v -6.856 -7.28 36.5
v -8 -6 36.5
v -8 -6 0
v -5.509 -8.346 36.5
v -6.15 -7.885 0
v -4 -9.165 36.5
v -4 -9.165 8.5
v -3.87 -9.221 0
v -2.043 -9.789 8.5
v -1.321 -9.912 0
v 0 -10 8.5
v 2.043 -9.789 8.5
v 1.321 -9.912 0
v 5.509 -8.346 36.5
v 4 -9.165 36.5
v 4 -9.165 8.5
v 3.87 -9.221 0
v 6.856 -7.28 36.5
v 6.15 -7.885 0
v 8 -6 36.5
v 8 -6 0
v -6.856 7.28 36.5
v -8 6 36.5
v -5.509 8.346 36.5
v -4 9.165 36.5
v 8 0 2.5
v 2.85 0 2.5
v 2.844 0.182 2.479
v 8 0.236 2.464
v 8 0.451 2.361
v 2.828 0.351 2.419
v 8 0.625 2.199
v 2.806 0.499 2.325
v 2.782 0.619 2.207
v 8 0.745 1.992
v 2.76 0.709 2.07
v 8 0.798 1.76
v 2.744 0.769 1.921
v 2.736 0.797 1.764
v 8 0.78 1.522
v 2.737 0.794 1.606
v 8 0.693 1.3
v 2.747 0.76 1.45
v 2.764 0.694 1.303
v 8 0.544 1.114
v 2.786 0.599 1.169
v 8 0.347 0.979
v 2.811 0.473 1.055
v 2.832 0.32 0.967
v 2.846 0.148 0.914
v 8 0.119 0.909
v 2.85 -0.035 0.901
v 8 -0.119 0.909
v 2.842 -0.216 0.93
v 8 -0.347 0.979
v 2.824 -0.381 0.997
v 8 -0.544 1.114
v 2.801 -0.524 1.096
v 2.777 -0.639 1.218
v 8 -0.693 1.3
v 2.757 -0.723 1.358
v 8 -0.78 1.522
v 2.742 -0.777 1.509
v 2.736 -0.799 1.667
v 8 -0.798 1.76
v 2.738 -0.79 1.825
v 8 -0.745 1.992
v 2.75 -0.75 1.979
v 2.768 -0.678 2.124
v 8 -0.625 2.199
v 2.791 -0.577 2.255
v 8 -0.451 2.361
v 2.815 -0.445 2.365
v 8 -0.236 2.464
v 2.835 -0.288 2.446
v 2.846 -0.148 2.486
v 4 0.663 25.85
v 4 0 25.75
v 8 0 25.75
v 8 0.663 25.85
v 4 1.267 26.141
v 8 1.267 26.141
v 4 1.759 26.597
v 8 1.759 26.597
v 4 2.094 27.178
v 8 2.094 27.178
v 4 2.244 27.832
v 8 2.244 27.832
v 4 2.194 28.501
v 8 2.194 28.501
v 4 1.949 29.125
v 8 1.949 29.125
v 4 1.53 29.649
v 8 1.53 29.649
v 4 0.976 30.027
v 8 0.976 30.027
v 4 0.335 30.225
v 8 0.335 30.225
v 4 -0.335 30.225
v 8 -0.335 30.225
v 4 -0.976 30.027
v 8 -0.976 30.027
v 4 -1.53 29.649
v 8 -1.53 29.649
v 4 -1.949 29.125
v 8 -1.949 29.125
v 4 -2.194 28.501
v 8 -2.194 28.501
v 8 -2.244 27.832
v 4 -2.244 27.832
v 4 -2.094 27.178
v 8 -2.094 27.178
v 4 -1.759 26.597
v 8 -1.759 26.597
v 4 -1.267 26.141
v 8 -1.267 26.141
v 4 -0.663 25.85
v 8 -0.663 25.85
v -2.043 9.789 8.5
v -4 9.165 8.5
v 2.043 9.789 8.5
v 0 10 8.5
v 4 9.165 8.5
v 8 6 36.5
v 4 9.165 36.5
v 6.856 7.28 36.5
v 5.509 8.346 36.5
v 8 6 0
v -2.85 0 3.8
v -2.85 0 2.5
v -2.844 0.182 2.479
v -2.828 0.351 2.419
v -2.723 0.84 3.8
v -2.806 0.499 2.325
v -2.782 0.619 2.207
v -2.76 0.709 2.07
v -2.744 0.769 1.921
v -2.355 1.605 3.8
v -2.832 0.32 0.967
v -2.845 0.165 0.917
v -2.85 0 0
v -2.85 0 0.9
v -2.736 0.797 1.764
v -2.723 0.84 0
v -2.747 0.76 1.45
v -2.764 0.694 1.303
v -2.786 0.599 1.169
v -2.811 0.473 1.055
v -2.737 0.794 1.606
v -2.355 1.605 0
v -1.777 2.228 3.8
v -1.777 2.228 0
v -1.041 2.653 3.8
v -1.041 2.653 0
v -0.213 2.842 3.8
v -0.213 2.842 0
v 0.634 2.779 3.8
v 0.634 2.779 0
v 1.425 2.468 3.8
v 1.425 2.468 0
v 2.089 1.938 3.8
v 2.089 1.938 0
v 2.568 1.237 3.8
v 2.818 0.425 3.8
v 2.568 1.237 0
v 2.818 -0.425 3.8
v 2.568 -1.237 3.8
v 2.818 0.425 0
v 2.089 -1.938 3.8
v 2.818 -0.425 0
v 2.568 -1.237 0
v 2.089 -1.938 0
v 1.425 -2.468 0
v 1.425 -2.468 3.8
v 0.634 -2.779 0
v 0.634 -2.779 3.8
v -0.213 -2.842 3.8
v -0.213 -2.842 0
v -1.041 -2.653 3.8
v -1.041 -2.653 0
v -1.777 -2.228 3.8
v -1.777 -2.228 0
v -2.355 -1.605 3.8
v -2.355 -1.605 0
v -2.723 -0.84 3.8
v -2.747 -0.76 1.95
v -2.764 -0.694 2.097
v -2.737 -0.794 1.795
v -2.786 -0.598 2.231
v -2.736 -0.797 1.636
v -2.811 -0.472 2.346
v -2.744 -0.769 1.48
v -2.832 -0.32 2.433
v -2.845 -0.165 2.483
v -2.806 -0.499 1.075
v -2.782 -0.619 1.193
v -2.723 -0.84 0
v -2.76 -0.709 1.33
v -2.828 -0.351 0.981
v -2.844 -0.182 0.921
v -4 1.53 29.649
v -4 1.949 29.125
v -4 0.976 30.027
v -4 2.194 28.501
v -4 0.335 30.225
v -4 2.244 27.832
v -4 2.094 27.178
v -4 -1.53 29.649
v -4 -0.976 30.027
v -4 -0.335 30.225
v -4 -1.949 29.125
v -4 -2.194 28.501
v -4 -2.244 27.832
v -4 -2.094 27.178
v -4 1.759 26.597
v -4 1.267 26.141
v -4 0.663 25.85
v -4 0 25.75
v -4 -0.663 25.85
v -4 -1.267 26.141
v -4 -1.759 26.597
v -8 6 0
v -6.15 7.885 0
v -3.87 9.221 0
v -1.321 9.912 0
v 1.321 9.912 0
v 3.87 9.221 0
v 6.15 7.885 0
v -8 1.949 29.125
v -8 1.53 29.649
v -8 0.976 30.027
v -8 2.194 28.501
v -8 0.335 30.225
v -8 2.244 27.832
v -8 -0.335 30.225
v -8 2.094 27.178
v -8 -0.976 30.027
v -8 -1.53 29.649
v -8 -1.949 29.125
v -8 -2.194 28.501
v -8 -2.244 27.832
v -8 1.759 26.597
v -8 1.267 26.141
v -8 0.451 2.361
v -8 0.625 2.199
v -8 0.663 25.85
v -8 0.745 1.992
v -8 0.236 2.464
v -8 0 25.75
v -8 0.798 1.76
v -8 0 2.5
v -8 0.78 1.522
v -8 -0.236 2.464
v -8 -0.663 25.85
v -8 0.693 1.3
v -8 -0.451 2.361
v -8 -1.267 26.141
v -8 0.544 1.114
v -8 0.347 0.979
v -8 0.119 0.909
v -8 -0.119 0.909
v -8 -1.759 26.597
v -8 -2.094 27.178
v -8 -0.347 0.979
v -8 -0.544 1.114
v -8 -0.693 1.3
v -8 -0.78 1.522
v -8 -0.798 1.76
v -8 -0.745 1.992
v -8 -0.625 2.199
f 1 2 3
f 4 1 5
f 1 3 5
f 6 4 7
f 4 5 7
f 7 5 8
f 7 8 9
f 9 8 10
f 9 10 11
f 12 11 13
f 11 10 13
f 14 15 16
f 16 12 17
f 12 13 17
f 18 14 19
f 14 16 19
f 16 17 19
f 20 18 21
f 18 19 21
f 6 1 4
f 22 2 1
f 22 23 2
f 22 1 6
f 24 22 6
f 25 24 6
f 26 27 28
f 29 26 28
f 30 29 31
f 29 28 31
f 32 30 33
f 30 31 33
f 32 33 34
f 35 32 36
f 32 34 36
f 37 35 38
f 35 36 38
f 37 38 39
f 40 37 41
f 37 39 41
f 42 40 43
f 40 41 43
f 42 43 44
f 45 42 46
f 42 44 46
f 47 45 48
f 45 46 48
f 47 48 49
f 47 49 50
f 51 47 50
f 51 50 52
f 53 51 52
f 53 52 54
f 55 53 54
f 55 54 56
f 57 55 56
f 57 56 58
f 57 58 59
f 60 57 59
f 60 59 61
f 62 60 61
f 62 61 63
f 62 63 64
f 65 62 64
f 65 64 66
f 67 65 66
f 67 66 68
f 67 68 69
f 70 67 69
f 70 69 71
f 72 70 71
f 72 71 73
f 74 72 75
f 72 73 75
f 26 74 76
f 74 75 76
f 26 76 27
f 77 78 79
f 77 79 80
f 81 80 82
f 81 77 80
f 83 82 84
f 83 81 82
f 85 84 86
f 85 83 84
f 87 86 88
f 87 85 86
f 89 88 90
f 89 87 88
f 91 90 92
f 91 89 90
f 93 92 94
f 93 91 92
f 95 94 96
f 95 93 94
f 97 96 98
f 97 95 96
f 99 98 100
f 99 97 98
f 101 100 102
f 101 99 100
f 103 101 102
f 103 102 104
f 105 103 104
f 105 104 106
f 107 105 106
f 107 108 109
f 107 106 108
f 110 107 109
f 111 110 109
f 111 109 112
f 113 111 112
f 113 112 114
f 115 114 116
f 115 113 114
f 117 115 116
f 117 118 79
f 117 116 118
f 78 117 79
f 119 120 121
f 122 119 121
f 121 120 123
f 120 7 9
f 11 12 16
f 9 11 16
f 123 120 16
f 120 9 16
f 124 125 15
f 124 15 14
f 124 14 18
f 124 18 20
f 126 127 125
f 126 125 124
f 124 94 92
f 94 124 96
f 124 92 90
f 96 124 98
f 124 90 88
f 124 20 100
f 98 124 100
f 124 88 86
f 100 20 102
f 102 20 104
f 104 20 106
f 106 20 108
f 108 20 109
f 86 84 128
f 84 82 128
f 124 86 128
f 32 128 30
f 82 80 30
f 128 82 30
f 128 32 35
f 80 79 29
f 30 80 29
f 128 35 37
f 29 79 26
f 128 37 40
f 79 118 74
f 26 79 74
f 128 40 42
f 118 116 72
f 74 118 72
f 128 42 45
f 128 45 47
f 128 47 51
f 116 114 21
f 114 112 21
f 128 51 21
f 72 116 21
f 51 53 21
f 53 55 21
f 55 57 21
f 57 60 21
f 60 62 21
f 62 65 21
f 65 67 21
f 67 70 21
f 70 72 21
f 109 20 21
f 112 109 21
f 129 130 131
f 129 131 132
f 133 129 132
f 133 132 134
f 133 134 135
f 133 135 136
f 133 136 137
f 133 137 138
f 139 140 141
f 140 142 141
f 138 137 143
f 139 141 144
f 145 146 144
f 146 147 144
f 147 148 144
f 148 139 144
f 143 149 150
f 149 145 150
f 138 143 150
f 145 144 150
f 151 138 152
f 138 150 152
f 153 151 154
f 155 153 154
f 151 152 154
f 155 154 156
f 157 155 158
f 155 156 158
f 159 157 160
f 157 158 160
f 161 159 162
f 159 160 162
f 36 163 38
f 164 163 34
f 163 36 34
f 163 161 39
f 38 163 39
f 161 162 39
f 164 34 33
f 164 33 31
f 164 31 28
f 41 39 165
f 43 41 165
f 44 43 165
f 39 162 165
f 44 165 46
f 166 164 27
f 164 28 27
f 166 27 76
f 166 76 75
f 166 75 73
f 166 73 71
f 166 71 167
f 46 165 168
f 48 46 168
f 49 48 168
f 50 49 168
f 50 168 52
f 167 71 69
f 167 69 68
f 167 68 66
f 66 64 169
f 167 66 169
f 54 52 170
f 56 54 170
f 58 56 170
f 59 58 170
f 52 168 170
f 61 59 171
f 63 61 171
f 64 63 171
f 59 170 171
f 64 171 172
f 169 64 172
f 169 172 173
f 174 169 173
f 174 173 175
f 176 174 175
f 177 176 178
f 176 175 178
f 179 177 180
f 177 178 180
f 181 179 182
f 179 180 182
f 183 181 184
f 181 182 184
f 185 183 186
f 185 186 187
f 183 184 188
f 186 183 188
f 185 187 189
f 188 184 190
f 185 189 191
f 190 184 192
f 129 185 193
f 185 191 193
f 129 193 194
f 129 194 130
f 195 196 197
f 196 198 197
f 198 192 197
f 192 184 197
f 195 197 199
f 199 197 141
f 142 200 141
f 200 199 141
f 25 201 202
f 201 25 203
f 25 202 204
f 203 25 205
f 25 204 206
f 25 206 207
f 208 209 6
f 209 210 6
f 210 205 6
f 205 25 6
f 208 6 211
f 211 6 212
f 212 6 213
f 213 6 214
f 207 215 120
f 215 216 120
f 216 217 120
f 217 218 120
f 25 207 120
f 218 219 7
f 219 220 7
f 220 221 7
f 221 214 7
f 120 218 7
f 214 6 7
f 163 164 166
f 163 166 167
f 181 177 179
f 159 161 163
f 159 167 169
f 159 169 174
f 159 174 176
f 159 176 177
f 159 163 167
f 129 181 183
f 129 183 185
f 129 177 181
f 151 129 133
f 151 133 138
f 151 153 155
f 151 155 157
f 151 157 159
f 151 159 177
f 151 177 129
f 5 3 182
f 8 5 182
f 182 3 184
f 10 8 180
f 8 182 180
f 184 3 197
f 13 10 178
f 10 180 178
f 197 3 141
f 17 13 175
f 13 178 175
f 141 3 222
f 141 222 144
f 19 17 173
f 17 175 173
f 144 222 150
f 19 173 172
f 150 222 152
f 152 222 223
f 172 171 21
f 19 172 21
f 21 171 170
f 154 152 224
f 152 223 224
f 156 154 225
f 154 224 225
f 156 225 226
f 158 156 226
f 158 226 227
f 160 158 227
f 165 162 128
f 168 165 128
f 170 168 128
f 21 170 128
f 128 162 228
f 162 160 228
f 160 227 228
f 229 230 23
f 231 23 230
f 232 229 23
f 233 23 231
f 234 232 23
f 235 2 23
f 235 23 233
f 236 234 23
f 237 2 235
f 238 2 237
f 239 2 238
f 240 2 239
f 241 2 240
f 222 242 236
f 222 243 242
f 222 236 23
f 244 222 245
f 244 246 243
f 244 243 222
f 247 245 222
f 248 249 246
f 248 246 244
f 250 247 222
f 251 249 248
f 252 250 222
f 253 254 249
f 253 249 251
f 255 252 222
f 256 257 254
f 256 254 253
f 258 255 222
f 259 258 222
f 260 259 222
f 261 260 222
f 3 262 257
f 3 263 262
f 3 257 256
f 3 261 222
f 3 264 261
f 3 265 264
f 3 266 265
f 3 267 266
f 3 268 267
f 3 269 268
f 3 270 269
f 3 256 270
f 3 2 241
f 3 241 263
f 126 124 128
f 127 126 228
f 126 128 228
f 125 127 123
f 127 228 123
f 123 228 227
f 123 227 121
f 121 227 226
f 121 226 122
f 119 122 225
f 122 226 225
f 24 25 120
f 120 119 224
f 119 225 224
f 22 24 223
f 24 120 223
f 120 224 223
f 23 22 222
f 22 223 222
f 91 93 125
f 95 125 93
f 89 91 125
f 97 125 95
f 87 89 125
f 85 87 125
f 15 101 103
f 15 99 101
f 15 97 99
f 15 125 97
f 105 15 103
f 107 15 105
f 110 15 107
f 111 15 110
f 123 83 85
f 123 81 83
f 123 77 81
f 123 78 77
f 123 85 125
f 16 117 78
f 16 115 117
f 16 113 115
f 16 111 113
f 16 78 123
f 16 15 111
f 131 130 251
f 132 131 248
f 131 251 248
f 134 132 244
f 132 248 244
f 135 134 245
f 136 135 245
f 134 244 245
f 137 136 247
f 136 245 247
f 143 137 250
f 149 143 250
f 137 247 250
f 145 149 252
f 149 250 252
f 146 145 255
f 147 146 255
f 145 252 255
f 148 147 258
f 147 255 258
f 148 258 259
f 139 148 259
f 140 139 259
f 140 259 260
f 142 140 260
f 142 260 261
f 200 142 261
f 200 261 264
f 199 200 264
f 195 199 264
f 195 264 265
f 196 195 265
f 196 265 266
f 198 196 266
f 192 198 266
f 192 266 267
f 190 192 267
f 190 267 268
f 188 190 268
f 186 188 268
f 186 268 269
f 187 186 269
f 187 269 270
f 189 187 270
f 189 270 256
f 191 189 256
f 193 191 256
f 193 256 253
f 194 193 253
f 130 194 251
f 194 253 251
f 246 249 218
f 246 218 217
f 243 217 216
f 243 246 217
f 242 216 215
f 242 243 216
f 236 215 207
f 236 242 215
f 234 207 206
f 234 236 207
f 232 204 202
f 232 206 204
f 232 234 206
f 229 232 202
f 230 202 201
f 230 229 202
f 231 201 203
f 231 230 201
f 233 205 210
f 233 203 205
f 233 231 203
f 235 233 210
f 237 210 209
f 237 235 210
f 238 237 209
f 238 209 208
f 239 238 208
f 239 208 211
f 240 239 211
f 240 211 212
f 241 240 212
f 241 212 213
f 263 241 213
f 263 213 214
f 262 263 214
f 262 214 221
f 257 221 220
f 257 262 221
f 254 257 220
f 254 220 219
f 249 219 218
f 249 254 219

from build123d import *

# Parameters (mm, degrees)
SKETCH_1_R               = 10
EXTRUDE_2_DEPTH          = 36.5
CUT_EXTRUDE_1_DEPTH      = 40.143965052
CUT_EXTRUDE_1_DEPTH_BACK = 40.143965052
SKETCH_3_W               = 8
SKETCH_3_H               = 28
CUT_EXTRUDE_2_DEPTH      = 40.143965052
CUT_EXTRUDE_2_DEPTH_BACK = 40.143965052
SKETCH_4_W               = 2
SKETCH_4_H               = 36.5
CUT_EXTRUDE_4_DEPTH      = 39.681390875
CUT_EXTRUDE_4_DEPTH_BACK = 39.681390875
SKETCH_6_R               = 2.25
SKETCH_7_R               = 2.85
CUT_EXTRUDE_5_DEPTH      = 3.8
SKETCH_8_R               = 0.8
CUT_EXTRUDE_6_DEPTH      = 42.088319508


with BuildPart() as part:
    # 草图1 → 凸台-拉伸2 (new body)
    with BuildSketch(Plane.XY):
        Circle(SKETCH_1_R)
    extrude(amount=EXTRUDE_2_DEPTH)

    # 草图3 → 切除-拉伸1 (cut, two sides: drawn at the far end of the back side and taken through both)
    with BuildSketch(Plane(origin=(0, 0, 0), x_dir=(1, 0, 0), z_dir=(0, 1, 0)).offset(-CUT_EXTRUDE_1_DEPTH_BACK)):
        with Locations((0, -22.5)):
            Rectangle(SKETCH_3_W, SKETCH_3_H)
    extrude(amount=CUT_EXTRUDE_1_DEPTH + CUT_EXTRUDE_1_DEPTH_BACK, mode=Mode.SUBTRACT)

    # 草图4 → 切除-拉伸2 (cut, two sides: drawn at the far end of the back side and taken through both)
    with BuildSketch(Plane(origin=(0, 0, 0), x_dir=(1, 0, 0), z_dir=(0, 1, 0)).offset(-CUT_EXTRUDE_2_DEPTH_BACK)):
        with Locations((-9, -18.25)):
            Rectangle(SKETCH_4_W, SKETCH_4_H)
        with Locations((9, -18.25)):
            Rectangle(SKETCH_4_W, SKETCH_4_H)
    extrude(amount=CUT_EXTRUDE_2_DEPTH + CUT_EXTRUDE_2_DEPTH_BACK, mode=Mode.SUBTRACT)

    # 草图6 → 切除-拉伸4 (cut, two sides: drawn at the far end of the back side and taken through both)
    with BuildSketch(Plane(origin=(0, 0, 0), x_dir=(0, 0, -1), z_dir=(1, 0, 0)).offset(-CUT_EXTRUDE_4_DEPTH_BACK)):
        with Locations((-28, 0)):
            Circle(SKETCH_6_R)
    extrude(amount=CUT_EXTRUDE_4_DEPTH + CUT_EXTRUDE_4_DEPTH_BACK, mode=Mode.SUBTRACT)

    # 草图7 → 切除-拉伸5 (cut)
    with BuildSketch(Plane(origin=(0, 0, 0), x_dir=(-1, 0, 0), z_dir=(0, 0, -1))):
        Circle(SKETCH_7_R)
    extrude(amount=-CUT_EXTRUDE_5_DEPTH, mode=Mode.SUBTRACT)

    # 草图8 → 切除-拉伸6 (cut, through all)
    with BuildSketch(Plane.ZY.offset(8)):
        with Locations((1.7, 0)):
            Circle(SKETCH_8_R)
    extrude(amount=-CUT_EXTRUDE_6_DEPTH, mode=Mode.SUBTRACT)


solid = part.part
